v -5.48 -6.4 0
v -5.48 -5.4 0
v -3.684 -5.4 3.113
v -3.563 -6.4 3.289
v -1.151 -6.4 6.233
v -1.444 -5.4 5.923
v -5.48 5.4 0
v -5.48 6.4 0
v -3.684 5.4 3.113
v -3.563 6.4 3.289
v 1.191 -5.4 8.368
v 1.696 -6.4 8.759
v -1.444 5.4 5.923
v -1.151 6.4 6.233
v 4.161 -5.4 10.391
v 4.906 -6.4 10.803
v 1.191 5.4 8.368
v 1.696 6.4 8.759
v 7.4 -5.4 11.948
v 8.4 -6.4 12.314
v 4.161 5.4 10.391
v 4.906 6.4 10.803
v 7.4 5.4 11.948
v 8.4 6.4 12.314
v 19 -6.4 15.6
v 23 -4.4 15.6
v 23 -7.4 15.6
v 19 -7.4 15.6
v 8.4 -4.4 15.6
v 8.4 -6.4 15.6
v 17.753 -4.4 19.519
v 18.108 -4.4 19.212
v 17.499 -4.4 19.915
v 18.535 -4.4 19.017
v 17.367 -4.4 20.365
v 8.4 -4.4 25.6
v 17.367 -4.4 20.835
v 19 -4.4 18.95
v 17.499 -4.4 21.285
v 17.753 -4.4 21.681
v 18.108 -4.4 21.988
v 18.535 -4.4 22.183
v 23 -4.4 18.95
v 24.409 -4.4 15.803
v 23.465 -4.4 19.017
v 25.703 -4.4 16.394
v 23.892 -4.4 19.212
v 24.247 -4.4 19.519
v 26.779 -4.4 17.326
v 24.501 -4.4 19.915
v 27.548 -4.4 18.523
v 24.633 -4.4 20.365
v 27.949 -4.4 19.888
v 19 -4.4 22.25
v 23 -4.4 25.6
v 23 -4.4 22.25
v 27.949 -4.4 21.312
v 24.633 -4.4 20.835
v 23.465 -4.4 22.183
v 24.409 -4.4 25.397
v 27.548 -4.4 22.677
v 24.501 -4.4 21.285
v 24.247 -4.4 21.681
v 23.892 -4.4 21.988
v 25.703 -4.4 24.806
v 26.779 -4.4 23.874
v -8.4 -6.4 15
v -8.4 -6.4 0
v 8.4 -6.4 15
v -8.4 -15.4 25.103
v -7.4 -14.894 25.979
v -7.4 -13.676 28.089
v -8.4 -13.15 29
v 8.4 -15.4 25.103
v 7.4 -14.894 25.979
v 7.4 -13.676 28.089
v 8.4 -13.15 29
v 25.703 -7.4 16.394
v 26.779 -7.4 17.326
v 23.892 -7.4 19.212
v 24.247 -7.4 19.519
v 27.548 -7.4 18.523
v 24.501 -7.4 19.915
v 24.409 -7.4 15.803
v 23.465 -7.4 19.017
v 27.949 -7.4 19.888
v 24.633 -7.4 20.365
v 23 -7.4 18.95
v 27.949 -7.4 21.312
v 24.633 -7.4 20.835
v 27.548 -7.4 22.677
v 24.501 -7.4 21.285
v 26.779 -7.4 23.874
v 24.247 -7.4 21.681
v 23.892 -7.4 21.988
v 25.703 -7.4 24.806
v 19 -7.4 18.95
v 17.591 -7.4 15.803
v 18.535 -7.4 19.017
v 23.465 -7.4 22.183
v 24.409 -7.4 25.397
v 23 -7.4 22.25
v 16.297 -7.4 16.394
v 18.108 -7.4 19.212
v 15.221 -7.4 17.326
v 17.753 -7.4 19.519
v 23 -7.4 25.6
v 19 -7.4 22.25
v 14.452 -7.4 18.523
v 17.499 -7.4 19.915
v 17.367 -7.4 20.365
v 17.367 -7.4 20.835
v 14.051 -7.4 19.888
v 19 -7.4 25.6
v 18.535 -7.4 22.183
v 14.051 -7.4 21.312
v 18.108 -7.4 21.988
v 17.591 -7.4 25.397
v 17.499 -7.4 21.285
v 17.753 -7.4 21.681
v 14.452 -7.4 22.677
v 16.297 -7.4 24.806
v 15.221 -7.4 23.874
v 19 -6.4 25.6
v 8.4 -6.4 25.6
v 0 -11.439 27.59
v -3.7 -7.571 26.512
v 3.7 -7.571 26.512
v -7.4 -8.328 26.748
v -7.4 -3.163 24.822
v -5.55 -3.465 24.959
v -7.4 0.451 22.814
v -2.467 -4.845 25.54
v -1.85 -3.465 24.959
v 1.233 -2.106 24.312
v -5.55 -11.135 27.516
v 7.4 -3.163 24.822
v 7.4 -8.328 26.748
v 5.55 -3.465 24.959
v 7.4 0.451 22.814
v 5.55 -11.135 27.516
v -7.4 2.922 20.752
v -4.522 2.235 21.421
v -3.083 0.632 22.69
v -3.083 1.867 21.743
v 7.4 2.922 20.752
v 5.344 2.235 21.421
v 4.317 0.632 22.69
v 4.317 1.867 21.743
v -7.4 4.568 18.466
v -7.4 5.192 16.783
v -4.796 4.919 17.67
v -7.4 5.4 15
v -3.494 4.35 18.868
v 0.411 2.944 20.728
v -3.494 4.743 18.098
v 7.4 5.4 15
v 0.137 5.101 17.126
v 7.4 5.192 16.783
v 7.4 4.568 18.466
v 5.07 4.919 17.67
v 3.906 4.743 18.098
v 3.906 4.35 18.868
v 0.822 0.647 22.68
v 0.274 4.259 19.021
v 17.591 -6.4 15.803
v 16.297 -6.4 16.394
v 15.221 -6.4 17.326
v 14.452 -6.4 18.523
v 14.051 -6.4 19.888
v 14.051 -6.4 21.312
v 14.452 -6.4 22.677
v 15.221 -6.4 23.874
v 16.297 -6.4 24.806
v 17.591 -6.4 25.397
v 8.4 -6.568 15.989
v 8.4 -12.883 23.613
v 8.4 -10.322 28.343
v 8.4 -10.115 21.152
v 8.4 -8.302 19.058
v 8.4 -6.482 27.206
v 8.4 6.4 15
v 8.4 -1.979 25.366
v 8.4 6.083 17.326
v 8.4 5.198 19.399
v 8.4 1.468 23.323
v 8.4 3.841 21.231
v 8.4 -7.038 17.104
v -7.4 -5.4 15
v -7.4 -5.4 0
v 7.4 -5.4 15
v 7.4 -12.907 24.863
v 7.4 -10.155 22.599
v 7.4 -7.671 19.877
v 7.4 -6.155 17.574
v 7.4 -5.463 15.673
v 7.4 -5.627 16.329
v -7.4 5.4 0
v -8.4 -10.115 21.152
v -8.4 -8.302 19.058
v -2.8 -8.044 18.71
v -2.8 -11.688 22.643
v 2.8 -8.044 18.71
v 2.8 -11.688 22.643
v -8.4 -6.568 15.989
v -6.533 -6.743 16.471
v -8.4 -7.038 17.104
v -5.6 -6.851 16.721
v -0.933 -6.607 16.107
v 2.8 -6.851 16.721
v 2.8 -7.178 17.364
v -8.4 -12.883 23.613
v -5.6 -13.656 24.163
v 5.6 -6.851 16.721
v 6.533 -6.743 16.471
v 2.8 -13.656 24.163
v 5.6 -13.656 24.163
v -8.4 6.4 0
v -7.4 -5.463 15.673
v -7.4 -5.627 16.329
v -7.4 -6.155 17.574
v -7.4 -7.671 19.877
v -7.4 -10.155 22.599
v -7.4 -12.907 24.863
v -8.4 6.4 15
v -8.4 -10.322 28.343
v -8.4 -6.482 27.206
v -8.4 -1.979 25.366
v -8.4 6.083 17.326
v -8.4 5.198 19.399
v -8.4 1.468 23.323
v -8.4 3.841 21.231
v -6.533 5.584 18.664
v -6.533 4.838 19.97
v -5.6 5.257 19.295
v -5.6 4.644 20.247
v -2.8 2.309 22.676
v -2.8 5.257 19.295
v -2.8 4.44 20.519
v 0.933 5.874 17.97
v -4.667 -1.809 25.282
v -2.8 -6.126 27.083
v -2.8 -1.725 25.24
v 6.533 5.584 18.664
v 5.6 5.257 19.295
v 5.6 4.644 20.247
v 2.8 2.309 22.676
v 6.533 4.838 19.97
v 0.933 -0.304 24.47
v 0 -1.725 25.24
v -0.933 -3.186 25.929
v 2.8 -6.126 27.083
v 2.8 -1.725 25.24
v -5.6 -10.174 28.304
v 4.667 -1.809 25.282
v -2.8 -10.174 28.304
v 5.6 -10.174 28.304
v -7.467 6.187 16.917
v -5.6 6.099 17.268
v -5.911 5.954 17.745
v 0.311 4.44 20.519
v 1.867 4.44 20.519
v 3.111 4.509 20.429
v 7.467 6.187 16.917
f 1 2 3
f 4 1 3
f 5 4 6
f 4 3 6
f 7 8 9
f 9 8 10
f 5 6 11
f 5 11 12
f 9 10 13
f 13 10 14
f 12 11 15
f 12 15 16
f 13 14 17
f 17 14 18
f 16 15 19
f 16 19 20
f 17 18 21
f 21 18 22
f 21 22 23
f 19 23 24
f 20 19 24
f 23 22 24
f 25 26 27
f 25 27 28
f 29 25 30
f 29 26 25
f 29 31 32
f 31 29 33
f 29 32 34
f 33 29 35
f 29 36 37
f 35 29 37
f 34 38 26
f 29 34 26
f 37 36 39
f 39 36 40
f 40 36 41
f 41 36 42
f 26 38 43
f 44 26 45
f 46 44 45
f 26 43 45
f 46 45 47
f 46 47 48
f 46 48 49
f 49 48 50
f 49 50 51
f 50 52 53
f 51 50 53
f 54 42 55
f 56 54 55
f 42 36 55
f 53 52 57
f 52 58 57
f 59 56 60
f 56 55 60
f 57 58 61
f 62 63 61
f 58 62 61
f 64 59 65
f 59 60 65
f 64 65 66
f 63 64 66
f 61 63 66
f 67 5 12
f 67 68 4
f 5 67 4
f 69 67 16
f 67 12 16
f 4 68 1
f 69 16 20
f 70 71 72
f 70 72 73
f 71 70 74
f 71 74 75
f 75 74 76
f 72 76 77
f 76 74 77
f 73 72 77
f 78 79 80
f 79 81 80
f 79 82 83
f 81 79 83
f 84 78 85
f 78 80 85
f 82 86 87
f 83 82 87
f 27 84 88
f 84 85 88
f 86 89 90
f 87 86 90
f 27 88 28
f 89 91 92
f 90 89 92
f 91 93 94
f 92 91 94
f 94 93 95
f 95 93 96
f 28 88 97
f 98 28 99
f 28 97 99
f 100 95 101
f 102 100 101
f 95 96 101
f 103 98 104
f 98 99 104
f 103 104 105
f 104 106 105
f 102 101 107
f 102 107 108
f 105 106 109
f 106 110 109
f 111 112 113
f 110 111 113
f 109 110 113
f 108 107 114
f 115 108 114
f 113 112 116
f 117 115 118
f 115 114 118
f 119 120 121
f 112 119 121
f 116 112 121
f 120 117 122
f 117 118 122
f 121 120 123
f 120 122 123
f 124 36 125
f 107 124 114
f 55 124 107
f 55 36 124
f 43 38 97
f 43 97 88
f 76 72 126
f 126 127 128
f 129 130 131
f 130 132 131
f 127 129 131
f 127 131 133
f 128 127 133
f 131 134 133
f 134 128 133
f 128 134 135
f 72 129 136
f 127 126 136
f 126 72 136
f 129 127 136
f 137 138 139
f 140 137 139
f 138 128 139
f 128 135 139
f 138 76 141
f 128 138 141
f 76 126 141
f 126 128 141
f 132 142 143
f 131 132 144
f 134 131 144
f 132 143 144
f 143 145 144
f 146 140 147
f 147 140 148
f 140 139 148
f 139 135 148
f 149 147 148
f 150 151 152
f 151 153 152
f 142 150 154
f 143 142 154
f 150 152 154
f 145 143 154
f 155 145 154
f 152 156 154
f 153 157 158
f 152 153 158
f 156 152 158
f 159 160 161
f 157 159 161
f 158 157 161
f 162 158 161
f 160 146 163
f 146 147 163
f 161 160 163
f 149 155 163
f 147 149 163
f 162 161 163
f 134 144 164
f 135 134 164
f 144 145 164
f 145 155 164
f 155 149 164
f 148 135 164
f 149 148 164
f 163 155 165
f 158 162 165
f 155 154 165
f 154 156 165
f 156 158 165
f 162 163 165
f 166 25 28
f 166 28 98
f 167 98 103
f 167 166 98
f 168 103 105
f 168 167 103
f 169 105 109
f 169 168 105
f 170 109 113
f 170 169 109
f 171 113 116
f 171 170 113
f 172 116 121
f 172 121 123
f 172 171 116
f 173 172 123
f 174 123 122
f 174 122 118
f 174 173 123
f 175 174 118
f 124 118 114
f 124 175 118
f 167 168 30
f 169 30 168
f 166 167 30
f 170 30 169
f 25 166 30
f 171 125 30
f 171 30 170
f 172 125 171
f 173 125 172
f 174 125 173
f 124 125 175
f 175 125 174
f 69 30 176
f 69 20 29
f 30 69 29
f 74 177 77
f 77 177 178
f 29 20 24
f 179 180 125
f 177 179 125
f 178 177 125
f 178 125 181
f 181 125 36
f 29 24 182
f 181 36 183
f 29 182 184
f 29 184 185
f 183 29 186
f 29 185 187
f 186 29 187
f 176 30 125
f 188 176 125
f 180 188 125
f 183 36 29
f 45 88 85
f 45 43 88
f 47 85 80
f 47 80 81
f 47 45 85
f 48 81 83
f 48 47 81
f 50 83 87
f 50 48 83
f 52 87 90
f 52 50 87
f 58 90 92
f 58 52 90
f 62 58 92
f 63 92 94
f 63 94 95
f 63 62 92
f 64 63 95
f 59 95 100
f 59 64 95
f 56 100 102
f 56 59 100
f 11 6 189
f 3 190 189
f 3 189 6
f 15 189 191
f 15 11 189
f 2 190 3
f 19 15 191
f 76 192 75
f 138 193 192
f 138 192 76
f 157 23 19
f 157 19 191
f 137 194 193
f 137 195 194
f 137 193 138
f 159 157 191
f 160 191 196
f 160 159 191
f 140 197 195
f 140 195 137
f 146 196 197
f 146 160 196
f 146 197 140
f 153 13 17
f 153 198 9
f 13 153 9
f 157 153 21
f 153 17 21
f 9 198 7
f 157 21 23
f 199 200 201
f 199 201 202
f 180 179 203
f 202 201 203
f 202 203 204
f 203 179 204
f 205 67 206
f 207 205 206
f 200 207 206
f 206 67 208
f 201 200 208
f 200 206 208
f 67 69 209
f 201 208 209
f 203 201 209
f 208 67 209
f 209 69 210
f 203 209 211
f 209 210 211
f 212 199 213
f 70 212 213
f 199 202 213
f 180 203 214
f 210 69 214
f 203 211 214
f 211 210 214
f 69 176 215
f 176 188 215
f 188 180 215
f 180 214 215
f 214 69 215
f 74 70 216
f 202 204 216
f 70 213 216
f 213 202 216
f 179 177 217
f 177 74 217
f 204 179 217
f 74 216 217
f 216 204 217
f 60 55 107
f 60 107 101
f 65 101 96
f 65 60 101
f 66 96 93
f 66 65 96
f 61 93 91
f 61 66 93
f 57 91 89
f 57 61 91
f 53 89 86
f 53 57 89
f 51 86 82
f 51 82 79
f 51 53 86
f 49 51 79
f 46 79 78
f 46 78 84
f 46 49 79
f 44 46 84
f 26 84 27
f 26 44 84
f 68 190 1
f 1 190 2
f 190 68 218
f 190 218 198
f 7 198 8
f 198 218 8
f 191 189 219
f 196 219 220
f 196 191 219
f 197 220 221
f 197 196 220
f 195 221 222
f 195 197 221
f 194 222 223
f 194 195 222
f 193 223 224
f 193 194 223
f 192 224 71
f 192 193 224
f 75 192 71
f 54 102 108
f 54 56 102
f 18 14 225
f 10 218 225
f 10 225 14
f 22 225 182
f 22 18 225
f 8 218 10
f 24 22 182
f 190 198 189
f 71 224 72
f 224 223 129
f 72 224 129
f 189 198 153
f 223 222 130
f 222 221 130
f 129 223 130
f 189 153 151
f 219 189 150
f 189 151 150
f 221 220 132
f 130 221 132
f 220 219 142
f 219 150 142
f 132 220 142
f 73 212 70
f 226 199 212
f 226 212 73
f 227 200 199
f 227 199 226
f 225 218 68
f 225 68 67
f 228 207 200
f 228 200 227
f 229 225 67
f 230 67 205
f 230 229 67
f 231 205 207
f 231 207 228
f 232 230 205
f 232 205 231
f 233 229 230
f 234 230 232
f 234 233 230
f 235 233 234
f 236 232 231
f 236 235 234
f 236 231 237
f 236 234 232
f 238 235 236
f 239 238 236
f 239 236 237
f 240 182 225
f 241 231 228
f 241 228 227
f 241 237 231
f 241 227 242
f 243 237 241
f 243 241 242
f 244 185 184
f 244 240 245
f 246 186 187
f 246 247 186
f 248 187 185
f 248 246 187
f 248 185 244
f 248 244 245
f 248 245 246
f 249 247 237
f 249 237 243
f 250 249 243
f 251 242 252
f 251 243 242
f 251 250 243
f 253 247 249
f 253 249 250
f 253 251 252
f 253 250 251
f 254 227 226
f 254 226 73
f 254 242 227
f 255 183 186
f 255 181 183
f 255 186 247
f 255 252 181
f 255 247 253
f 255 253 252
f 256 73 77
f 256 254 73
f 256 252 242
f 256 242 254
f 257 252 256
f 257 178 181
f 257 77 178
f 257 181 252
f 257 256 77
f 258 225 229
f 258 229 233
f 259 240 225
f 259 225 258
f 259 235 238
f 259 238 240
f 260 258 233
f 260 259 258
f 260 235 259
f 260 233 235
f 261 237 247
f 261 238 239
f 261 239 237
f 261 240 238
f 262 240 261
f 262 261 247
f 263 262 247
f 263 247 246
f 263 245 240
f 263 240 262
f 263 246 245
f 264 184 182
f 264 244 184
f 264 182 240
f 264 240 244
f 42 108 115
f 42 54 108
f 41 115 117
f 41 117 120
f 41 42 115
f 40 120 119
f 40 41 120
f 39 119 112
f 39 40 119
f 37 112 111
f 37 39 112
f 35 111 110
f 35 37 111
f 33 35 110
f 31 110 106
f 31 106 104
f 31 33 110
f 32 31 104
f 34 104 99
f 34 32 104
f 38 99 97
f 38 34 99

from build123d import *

# Parameters (mm, degrees)
ESBO_O1_W                = 16.8
ESBO_O1_H                = 12.8
RESSALTO_EXTRUS_O1_DEPTH = 15
RESSALTO_EXTRUS_O2_DEPTH = 16.8
CASCA1_T                 = -1
ESBO_O5_R                = 24
CORTE_EXTRUS_O1_DEPTH    = 22.8000001
RESSALTO_EXTRUS_O3_DEPTH = 2
RESSALTO_EXTRUS_O4_DEPTH = 1


with BuildPart() as part:
    # Esboço1 → Ressalto-extrusão1 (new body)
    with BuildSketch(Plane.XY):
        Rectangle(ESBO_O1_W, ESBO_O1_H)
    extrude(amount=RESSALTO_EXTRUS_O1_DEPTH)

    # Esboço2 → Ressalto-extrusão2 (add, through all)
    with BuildSketch(Plane(origin=(8.4, 0, 0), x_dir=(0, 0, -1), z_dir=(1, 0, 0))):
        with BuildLine():
            Line((-25.102885683, -15.4), (-29, -13.15))
            add(Edge.make_bspline(
                [(-15, 6.4), (-24.5700068, 6.4), (-28.06930524, -8.749171672), (-29, -13.15)],
                knots=[0, 0, 0, 0, 1, 1, 1, 1], degree=3))
            Line((-15, 6.4), (-15, -6.4))
            add(Edge.make_bspline(
                [(-15, -6.4), (-18.032161103, -6.4), (-23.944769552, -12.297903221), (-25.102885683, -15.4)],
                knots=[0, 0, 0, 0, 1, 1, 1, 1], degree=3))
        make_face()
    extrude(amount=-RESSALTO_EXTRUS_O2_DEPTH)

    # Casca1
    casca1_openings = [part.faces().sort_by_distance(p)[0] for p in [
        (0, -14.275, 27.051442841),
        (0, 0, 0),
    ]]
    offset(amount=CASCA1_T, openings=casca1_openings)

    # Esboço5 → Corte-extrusão1 (cut, through all)
    with BuildSketch(Plane(origin=(0, 6.4, 0), x_dir=(1, 0, 0), z_dir=(0, 1, 0))):
        with Locations((16.15, 10.4)):
            Circle(ESBO_O5_R)
    extrude(amount=-CORTE_EXTRUS_O1_DEPTH, mode=Mode.SUBTRACT)

    # Esboço6 → Ressalto-extrusão3 (add)
    with BuildSketch(Plane.XZ.offset(6.4)):
        with BuildLine():
            Line((23, 25.6), (8.4, 25.6))
            Line((8.4, 25.6), (8.4, 15.6))
            Line((8.4, 15.6), (23, 15.6))
            ThreePointArc((23, 15.6), (28, 20.6), (23, 25.6))
        make_face()
        with BuildLine():
            Line((19, 22.25), (23, 22.25))
            ThreePointArc((23, 22.25), (24.65, 20.6), (23, 18.95))
            Line((23, 18.95), (19, 18.95))
            ThreePointArc((19, 18.95), (17.35, 20.6), (19, 22.25))
        make_face(mode=Mode.SUBTRACT)
    extrude(amount=-RESSALTO_EXTRUS_O3_DEPTH)

    # Esboço7 → Ressalto-extrusão4 (add)
    with BuildSketch(Plane.XZ.offset(6.4)):
        with BuildLine():
            Line((19, 25.6), (23, 25.6))
            ThreePointArc((23, 25.6), (28, 20.6), (23, 15.6))
            Line((23, 15.6), (19, 15.6))
            ThreePointArc((19, 15.6), (14, 20.6), (19, 25.6))
        make_face()
        with BuildLine():
            Line((19, 18.95), (23, 18.95))
            ThreePointArc((23, 18.95), (24.65, 20.6), (23, 22.25))
            Line((23, 22.25), (19, 22.25))
            ThreePointArc((19, 22.25), (17.35, 20.6), (19, 18.95))
        make_face(mode=Mode.SUBTRACT)
    extrude(amount=RESSALTO_EXTRUS_O4_DEPTH)


solid = part.part
